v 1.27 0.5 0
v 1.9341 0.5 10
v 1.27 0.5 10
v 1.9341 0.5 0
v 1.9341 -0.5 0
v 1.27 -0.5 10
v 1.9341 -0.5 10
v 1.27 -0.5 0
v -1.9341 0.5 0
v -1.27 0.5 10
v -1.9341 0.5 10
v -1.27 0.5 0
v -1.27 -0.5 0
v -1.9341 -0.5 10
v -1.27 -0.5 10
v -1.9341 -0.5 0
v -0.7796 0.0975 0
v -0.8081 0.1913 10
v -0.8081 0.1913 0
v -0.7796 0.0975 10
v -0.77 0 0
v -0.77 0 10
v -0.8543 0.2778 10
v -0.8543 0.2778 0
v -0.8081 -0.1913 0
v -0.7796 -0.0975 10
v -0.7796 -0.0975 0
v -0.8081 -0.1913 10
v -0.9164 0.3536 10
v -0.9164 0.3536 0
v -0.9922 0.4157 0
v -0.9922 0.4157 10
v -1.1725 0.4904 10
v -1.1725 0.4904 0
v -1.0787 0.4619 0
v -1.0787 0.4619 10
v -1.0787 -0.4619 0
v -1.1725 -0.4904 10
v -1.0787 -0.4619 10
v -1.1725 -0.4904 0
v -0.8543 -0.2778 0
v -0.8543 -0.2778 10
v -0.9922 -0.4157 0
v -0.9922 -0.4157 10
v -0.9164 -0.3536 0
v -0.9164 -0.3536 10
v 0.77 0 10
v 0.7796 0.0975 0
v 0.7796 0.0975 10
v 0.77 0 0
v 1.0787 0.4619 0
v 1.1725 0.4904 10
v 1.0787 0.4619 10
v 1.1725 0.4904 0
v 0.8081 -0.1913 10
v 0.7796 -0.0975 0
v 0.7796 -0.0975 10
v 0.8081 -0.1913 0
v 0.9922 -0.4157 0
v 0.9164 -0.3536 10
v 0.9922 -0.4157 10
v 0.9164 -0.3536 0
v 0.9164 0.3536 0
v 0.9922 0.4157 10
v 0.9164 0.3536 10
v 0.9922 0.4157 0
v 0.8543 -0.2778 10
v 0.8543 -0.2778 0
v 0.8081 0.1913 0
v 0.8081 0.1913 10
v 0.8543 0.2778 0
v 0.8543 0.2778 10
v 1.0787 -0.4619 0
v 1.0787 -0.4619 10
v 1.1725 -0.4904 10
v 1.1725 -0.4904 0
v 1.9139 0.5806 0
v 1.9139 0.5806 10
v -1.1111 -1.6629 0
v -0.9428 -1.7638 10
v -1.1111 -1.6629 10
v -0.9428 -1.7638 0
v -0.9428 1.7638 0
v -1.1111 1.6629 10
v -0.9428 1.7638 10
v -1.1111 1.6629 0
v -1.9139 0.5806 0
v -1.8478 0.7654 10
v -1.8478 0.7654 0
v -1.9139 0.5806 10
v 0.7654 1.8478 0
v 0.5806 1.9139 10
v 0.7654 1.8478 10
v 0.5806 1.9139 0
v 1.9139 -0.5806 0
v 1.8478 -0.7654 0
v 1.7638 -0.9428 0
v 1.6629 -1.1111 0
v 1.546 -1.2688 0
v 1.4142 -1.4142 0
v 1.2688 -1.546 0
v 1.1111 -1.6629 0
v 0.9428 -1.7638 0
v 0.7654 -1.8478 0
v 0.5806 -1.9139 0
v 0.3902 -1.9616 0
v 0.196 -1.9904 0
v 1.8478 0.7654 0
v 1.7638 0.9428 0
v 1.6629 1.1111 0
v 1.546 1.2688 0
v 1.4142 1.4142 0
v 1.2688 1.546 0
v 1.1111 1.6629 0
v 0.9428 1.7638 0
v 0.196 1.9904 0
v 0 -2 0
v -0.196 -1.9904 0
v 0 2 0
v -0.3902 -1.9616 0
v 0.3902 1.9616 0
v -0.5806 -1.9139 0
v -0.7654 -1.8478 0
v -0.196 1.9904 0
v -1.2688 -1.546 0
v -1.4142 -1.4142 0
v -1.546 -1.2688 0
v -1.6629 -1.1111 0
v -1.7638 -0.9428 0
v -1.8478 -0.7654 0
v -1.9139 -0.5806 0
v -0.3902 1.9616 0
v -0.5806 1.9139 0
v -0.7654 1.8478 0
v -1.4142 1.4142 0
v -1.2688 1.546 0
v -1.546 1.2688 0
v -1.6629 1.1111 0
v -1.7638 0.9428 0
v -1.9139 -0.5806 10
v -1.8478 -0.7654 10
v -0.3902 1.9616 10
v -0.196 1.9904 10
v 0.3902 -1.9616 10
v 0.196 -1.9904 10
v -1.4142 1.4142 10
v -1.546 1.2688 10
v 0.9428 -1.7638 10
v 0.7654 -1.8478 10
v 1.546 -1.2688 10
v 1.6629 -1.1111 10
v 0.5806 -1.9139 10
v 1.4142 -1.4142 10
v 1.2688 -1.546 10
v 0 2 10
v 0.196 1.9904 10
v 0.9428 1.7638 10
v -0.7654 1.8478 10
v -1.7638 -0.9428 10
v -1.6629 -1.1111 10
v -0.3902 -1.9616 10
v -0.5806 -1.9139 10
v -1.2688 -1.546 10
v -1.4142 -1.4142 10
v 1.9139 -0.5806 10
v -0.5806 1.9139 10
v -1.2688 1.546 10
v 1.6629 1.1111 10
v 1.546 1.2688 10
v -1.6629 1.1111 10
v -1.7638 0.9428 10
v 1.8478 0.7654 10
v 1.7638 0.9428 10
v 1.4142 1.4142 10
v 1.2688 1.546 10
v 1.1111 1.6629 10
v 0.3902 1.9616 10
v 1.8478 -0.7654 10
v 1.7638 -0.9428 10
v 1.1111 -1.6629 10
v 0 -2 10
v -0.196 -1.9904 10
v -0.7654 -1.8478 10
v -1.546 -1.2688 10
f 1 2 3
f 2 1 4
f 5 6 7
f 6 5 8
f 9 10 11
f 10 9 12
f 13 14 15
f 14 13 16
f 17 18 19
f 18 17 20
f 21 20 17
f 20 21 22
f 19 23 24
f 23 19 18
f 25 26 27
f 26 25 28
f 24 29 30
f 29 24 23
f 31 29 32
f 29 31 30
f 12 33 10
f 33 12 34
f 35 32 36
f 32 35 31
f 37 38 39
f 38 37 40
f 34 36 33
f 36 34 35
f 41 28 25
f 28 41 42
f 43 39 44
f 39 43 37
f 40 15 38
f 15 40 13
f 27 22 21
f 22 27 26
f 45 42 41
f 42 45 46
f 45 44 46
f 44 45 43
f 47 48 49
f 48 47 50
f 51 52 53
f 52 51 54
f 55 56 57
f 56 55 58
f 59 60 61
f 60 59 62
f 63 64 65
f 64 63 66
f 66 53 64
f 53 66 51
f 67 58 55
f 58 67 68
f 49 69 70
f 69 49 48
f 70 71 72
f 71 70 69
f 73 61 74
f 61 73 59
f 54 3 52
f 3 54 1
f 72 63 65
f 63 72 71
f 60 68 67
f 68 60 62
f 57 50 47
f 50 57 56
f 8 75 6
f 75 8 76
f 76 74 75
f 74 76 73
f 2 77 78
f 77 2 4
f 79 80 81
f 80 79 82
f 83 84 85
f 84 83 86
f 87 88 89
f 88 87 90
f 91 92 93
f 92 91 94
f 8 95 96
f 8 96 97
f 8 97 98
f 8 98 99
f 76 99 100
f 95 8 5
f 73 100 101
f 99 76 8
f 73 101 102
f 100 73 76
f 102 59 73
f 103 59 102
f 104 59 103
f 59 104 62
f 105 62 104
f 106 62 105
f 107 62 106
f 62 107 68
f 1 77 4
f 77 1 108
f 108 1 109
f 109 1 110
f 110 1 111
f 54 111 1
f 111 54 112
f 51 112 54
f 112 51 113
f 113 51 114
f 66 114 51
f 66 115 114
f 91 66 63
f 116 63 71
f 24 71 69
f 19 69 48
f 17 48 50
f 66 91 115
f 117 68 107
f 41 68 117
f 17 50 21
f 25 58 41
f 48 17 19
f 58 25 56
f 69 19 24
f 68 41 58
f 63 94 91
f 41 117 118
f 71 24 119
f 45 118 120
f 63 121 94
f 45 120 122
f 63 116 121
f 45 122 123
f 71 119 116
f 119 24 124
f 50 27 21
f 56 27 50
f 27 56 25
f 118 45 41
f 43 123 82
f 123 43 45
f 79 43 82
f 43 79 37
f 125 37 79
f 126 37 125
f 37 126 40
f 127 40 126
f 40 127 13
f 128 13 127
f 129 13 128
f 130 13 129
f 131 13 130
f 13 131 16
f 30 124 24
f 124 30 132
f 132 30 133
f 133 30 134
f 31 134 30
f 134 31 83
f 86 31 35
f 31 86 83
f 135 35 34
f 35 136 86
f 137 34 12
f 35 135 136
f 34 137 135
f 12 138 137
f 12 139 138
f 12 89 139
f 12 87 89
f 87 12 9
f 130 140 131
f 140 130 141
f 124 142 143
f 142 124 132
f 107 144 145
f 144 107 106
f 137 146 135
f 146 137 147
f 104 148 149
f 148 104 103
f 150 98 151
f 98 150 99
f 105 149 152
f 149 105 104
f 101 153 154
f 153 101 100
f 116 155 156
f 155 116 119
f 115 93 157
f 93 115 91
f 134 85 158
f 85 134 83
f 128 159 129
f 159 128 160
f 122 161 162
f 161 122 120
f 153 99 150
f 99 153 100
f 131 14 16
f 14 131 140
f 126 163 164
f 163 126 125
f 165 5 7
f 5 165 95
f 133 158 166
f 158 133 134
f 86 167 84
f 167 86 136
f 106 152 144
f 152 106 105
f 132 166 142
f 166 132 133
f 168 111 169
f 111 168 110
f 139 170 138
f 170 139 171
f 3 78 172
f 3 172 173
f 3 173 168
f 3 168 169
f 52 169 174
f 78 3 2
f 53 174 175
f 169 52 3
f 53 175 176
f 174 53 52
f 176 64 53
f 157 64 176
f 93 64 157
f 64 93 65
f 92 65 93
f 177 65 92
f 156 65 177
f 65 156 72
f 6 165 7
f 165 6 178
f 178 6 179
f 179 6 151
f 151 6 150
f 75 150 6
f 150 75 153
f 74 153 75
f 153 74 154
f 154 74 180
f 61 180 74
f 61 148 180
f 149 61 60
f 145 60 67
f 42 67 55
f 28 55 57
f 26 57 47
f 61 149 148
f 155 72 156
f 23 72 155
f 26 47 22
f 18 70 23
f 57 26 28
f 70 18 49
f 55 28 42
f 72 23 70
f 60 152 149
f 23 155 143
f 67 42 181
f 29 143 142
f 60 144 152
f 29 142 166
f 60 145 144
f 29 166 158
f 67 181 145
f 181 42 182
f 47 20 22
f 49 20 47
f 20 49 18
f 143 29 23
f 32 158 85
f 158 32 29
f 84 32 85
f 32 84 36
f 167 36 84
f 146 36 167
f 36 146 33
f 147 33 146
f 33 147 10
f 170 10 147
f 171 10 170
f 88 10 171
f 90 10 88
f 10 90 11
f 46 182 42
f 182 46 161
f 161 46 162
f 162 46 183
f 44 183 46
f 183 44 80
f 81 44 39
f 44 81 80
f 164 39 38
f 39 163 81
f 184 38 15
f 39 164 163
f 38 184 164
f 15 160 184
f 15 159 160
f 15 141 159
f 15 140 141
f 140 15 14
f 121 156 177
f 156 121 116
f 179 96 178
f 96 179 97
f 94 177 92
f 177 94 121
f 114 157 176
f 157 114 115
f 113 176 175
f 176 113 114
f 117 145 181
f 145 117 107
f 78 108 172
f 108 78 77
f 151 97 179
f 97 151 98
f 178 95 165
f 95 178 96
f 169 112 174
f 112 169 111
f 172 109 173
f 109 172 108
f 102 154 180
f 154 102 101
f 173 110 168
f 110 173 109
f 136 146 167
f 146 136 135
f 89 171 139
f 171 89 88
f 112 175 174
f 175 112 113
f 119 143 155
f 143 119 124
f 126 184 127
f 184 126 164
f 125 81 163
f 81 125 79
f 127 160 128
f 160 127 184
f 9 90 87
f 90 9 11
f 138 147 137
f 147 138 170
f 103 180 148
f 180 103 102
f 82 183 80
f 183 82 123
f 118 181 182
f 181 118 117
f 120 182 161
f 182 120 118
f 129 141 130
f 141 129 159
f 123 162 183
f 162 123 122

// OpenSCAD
/* [Led Type] */
side_opened= "true"; //[true:Opened, false:Closed]
led_diameter= 3; //[3:3mm, 5:5mm, 8:8mm, 10:10mm]
number_of_pins= 2; //[2:2, 3:3, 4:4]
pins_spacing= 2.54;
height= 10;

difference () {
    cylinder (h= height, d= led_diameter + 1, $fn= 64);
    union () {
        if (number_of_pins == 2) {
            translate ([-pins_spacing / 2, 0, -0.1]) cylinder (h= height + 0.2, d= 1, $fn= 32);
            translate ([pins_spacing / 2, 0, -0.1]) cylinder (h= height + 0.2, d= 1, $fn= 32);
            if (side_opened == "true" && pins_spacing > 1) {
                translate ([pins_spacing / 2 + 50, 0, height / 2])
                    cube (size= [100, 1, height + 0.2], center= true);
                translate ([-pins_spacing / 2 - 50, 0, height/ 2])
                    cube (size= [100, 1, height + 0.2], center= true);
            }
        } else if (number_of_pins == 3) {
            translate ([0, 0, -0.1]) cylinder (h= height + 0.2, d= 1, $fn= 100);
            translate ([-pins_spacing, 0, -0.1]) cylinder (h= height + 0.2, d= 1, $fn= 32);
            translate ([pins_spacing, 0, -0.1]) cylinder (h= height + 0.2, d= 1, $fn= 32);
            if (side_opened == "true" && pins_spacing > 1) {
                translate ([-0.5, 0, -0.1]) cube (size= [1, 100, height + 0.2]);
                translate ([pins_spacing - 0.5, 0, -0.1]) cube (size= [1, 100, height + 0.2]);
                translate ([-pins_spacing - 0.5, 0, -0.1]) cube (size= [1, 100, height + 0.2]);
            }
        } else if (number_of_pins == 4) {
            translate ([-pins_spacing / 2, 0, -0.1]) cylinder (h= height + 0.2, d= 1, $fn= 32);
            translate ([pins_spacing / 2, 0, -0.1]) cylinder (h= height + 0.2, d= 1, $fn= 32);
            translate ([-pins_spacing - pins_spacing / 2, 0, -0.1])
                cylinder (h= height + 0.2, d= 1, $fn= 32);
            translate ([pins_spacing + pins_spacing / 2, 0, -0.1])
                cylinder (h= height + 0.2, d= 1, $fn= 32);
            if (side_opened == "true" && pins_spacing > 1) {
                translate ([pins_spacing / 2 - 0.5, 0, -0.1]) cube (size= [1, 100, height + 0.2]);
                translate ([-pins_spacing / 2 - 0.5, 0, -0.1]) cube (size= [1, 100, height + 0.2]);
                translate ([pins_spacing + pins_spacing / 2 - 0.5, 0, -0.1])
                    cube (size= [1, 100, height + 0.2]);
                translate ([-pins_spacing - pins_spacing / 2 - 0.5, 0, -0.1])
                    cube (size= [1, 100, height + 0.2]);
            }
        }
        if (pins_spacing <= 1)
        {
            translate ([0, 0, height / 2])
                cube (size= [(number_of_pins - 1) * pins_spacing, 1, height + 0.2],
                center= true);
            if (side_opened == "true")
                translate ([0, 50, height / 2])
                    cube (size= [(number_of_pins - 1) * pins_spacing + 1, 100, height + 0.2],
                    center= true);
        }
    }
}
